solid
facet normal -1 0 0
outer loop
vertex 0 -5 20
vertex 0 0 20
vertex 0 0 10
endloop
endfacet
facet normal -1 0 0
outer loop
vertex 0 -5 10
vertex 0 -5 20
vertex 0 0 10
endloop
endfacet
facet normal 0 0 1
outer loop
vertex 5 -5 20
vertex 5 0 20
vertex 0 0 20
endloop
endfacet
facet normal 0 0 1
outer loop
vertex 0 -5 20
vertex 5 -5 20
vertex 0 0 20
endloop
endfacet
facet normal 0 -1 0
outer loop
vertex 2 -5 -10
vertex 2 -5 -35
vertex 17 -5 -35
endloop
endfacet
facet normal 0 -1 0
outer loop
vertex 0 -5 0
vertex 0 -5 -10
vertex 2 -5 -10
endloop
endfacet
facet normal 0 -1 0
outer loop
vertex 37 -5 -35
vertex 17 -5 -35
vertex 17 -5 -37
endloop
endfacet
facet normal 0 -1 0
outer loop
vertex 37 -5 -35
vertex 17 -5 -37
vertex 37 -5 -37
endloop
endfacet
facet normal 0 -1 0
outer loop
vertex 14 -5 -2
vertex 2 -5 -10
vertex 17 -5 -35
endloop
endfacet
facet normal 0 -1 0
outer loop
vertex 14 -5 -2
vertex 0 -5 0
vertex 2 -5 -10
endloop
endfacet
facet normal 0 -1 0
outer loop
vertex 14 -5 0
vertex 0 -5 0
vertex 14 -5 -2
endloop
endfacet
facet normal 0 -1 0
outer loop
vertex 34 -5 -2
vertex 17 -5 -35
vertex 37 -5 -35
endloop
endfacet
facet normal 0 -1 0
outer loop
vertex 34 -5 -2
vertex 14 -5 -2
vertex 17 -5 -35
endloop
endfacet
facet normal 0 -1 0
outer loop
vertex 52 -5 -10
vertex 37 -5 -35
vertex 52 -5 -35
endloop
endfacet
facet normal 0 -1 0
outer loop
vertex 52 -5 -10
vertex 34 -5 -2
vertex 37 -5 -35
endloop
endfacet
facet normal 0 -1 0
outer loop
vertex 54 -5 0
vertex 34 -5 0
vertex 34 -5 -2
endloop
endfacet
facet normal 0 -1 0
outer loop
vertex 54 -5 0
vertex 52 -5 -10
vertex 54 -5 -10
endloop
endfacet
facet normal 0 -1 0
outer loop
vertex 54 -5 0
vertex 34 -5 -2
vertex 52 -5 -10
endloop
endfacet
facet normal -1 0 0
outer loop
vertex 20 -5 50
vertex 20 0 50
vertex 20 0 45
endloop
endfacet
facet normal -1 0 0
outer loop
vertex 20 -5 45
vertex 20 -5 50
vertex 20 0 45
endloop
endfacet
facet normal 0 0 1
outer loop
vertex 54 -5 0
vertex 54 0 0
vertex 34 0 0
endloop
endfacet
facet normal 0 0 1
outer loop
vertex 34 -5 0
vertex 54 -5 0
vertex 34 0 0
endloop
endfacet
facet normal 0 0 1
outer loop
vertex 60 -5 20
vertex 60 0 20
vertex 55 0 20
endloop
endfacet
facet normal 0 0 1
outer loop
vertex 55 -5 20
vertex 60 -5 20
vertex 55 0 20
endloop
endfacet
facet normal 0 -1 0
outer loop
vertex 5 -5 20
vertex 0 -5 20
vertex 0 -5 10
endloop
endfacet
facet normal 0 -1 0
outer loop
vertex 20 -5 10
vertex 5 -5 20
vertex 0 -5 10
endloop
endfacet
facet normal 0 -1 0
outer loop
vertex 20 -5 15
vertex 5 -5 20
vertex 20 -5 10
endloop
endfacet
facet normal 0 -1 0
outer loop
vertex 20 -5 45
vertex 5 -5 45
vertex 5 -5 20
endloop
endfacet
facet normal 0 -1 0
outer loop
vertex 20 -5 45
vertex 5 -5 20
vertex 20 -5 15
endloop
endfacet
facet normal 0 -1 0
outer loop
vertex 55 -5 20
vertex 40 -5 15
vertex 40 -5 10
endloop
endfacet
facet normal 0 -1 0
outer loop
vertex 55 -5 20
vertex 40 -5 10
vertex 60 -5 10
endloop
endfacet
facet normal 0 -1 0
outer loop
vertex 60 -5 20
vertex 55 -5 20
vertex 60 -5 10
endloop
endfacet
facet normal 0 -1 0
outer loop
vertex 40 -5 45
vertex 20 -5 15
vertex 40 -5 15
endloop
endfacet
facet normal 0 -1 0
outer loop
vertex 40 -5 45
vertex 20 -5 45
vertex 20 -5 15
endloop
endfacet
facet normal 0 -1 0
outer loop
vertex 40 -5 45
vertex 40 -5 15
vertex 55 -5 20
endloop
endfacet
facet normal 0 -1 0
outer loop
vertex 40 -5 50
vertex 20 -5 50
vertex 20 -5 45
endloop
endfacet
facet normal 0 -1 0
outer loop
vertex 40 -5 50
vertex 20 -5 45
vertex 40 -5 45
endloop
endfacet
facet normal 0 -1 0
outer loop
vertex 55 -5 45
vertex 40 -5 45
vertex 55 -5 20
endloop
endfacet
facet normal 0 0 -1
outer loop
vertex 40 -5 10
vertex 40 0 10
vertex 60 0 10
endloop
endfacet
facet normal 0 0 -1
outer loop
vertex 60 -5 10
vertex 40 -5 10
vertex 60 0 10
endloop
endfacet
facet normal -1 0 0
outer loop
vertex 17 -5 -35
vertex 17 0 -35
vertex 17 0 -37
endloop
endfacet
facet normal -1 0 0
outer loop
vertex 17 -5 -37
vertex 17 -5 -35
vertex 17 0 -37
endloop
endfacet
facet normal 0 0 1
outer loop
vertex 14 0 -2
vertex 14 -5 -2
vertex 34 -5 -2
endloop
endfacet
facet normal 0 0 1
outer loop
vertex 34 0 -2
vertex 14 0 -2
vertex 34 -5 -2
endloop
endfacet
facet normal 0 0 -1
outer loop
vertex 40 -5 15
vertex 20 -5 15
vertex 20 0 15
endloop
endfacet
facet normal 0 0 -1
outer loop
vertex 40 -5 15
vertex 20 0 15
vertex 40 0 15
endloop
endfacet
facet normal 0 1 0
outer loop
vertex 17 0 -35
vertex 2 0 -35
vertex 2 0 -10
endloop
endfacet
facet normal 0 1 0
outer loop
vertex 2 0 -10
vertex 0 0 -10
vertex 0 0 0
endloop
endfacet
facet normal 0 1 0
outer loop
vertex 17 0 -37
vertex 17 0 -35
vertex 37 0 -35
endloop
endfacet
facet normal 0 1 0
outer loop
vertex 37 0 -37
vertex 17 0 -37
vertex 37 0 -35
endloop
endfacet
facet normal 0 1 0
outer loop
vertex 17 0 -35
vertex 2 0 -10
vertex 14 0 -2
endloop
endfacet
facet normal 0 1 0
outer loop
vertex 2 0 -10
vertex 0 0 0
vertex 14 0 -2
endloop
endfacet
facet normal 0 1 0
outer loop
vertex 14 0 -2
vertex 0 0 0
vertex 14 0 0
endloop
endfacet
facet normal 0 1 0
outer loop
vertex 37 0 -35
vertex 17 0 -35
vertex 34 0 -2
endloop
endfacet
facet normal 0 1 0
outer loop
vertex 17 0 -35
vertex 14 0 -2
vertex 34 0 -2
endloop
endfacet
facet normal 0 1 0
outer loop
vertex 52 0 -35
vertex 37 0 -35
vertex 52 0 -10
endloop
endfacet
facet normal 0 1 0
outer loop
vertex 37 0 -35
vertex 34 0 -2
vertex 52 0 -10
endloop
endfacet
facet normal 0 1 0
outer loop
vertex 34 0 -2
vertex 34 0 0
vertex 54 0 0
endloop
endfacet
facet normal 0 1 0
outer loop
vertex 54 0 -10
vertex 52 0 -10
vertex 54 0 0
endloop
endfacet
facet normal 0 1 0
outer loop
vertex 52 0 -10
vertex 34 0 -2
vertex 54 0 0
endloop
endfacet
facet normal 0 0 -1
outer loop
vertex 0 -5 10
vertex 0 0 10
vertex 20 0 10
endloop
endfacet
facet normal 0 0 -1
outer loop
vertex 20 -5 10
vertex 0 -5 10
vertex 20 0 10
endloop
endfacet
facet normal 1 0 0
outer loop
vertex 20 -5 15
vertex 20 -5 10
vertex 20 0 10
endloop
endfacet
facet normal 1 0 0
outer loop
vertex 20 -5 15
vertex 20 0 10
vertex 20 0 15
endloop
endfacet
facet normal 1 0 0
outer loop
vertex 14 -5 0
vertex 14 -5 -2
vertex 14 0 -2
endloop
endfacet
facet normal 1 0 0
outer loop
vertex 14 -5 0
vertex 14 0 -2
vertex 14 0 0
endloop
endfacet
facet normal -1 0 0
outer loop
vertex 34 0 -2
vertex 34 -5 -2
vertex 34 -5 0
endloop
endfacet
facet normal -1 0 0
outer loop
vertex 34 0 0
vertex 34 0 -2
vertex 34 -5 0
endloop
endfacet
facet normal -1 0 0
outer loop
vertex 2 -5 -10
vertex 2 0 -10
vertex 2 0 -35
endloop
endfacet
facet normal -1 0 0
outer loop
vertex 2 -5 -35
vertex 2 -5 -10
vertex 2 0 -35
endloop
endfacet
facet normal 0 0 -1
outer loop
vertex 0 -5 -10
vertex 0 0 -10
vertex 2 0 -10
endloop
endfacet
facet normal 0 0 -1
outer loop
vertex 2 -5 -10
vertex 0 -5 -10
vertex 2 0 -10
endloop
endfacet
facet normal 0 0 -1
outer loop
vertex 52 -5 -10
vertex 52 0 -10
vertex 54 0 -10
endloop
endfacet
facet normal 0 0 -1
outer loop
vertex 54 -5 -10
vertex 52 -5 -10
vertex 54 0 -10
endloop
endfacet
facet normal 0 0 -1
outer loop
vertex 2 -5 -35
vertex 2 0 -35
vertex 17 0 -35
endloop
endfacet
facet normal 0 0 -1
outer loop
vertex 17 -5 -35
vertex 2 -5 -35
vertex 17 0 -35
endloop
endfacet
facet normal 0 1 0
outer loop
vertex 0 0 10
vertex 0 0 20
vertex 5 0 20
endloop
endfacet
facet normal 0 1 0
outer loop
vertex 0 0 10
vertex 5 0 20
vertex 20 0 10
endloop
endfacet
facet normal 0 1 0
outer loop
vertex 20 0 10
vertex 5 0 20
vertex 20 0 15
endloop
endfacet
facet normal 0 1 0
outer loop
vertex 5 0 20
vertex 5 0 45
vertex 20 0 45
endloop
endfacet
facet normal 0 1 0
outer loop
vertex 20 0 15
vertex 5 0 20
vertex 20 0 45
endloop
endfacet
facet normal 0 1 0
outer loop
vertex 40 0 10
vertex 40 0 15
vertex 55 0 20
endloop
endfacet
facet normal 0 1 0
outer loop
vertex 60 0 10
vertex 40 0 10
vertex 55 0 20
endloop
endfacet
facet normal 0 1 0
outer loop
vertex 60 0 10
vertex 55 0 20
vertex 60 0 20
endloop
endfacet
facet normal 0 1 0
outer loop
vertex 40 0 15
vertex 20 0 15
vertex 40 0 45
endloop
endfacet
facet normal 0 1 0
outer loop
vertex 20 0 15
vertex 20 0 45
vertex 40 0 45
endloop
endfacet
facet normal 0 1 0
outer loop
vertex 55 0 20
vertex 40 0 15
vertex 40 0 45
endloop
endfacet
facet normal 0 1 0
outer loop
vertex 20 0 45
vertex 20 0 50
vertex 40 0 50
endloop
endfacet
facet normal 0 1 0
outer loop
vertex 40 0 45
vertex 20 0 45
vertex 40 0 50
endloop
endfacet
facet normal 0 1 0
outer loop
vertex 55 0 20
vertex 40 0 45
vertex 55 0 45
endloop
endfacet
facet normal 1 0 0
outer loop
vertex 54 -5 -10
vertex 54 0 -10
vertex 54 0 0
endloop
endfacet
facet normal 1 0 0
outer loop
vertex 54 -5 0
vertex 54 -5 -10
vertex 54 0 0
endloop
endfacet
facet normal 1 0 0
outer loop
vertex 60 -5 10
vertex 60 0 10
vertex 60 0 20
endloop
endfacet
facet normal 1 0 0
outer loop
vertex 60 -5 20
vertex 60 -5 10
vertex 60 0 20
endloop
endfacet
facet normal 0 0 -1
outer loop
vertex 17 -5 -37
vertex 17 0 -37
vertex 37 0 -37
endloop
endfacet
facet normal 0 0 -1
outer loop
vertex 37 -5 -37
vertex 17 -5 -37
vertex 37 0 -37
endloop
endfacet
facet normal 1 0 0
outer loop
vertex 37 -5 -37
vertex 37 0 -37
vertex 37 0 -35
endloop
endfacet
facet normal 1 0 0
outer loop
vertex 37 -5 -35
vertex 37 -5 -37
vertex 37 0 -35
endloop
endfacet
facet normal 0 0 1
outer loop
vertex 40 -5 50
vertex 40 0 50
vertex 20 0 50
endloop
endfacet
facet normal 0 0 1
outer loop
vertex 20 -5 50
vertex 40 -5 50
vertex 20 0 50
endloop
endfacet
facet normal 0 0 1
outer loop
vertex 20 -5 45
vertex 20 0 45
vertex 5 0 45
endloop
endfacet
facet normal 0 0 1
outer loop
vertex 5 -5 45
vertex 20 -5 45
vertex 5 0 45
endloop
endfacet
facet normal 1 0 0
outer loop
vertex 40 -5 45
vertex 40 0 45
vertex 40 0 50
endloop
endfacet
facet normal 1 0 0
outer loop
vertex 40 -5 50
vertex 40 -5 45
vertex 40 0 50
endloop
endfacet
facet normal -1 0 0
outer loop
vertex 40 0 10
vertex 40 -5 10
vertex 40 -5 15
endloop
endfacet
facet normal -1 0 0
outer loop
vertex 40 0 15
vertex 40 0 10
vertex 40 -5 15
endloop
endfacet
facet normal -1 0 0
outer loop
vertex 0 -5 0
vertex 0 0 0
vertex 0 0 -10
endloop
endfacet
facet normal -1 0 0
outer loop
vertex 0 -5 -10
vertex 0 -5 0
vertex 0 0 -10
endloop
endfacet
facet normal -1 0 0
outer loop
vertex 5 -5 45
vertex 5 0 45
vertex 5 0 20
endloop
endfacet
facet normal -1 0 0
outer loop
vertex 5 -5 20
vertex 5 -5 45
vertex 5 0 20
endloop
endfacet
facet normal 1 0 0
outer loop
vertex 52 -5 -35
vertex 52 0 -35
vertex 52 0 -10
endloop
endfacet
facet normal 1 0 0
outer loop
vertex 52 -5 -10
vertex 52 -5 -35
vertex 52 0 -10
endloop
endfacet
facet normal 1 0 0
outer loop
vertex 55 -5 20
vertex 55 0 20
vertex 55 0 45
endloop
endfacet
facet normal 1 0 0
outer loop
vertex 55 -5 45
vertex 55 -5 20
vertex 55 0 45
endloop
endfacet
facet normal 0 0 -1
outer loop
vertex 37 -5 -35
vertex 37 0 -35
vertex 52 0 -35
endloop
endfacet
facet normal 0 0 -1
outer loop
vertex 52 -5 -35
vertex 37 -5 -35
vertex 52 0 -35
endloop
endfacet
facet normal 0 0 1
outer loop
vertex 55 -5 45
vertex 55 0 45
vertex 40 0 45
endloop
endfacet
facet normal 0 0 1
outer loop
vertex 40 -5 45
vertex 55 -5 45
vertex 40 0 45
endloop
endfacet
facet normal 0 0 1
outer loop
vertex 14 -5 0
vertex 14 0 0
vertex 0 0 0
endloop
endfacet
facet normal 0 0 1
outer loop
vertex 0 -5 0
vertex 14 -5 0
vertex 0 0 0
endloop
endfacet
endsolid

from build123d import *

# Parameters (mm, degrees)
F2_DEPTH = 5
F3_W     = 20
F3_H     = 2
F5_DEPTH = 5
F4_W     = 20
F4_H     = 5
F6_DEPTH = 5


with BuildPart() as f2:
    # F1 (on Front) + F0 (on Front) → F2 (new body)
    with BuildSketch(Plane.XZ):
        Polygon((0, 20), (0, 10), (60, 10), (60, 20), (55, 20), (55, 45), (40, 45), (40, 50), (20, 50), (20, 45), (5, 45), (5, 20), align=None)
    with BuildSketch(Plane.XZ):
        Polygon((54, 0), (0, 0), (0, -10), (2, -10), (2, -35), (17, -35), (17, -37), (37, -37), (37, -35), (52, -35), (52, -10), (54, -10), align=None)
    extrude(amount=F2_DEPTH)

    # F3 (on face) → F5 (cut)
    with BuildSketch(Plane.XZ.offset(5)):
        with Locations((24, -1)):
            Rectangle(F3_W, F3_H)
    extrude(amount=-F5_DEPTH, mode=Mode.SUBTRACT)

    # F4 (on face) → F6 (cut)
    with BuildSketch(Plane.XZ.offset(5)):
        with Locations((30, 12.5)):
            Rectangle(F4_W, F4_H)
    extrude(amount=-F6_DEPTH, mode=Mode.SUBTRACT)


solid = f2.part
